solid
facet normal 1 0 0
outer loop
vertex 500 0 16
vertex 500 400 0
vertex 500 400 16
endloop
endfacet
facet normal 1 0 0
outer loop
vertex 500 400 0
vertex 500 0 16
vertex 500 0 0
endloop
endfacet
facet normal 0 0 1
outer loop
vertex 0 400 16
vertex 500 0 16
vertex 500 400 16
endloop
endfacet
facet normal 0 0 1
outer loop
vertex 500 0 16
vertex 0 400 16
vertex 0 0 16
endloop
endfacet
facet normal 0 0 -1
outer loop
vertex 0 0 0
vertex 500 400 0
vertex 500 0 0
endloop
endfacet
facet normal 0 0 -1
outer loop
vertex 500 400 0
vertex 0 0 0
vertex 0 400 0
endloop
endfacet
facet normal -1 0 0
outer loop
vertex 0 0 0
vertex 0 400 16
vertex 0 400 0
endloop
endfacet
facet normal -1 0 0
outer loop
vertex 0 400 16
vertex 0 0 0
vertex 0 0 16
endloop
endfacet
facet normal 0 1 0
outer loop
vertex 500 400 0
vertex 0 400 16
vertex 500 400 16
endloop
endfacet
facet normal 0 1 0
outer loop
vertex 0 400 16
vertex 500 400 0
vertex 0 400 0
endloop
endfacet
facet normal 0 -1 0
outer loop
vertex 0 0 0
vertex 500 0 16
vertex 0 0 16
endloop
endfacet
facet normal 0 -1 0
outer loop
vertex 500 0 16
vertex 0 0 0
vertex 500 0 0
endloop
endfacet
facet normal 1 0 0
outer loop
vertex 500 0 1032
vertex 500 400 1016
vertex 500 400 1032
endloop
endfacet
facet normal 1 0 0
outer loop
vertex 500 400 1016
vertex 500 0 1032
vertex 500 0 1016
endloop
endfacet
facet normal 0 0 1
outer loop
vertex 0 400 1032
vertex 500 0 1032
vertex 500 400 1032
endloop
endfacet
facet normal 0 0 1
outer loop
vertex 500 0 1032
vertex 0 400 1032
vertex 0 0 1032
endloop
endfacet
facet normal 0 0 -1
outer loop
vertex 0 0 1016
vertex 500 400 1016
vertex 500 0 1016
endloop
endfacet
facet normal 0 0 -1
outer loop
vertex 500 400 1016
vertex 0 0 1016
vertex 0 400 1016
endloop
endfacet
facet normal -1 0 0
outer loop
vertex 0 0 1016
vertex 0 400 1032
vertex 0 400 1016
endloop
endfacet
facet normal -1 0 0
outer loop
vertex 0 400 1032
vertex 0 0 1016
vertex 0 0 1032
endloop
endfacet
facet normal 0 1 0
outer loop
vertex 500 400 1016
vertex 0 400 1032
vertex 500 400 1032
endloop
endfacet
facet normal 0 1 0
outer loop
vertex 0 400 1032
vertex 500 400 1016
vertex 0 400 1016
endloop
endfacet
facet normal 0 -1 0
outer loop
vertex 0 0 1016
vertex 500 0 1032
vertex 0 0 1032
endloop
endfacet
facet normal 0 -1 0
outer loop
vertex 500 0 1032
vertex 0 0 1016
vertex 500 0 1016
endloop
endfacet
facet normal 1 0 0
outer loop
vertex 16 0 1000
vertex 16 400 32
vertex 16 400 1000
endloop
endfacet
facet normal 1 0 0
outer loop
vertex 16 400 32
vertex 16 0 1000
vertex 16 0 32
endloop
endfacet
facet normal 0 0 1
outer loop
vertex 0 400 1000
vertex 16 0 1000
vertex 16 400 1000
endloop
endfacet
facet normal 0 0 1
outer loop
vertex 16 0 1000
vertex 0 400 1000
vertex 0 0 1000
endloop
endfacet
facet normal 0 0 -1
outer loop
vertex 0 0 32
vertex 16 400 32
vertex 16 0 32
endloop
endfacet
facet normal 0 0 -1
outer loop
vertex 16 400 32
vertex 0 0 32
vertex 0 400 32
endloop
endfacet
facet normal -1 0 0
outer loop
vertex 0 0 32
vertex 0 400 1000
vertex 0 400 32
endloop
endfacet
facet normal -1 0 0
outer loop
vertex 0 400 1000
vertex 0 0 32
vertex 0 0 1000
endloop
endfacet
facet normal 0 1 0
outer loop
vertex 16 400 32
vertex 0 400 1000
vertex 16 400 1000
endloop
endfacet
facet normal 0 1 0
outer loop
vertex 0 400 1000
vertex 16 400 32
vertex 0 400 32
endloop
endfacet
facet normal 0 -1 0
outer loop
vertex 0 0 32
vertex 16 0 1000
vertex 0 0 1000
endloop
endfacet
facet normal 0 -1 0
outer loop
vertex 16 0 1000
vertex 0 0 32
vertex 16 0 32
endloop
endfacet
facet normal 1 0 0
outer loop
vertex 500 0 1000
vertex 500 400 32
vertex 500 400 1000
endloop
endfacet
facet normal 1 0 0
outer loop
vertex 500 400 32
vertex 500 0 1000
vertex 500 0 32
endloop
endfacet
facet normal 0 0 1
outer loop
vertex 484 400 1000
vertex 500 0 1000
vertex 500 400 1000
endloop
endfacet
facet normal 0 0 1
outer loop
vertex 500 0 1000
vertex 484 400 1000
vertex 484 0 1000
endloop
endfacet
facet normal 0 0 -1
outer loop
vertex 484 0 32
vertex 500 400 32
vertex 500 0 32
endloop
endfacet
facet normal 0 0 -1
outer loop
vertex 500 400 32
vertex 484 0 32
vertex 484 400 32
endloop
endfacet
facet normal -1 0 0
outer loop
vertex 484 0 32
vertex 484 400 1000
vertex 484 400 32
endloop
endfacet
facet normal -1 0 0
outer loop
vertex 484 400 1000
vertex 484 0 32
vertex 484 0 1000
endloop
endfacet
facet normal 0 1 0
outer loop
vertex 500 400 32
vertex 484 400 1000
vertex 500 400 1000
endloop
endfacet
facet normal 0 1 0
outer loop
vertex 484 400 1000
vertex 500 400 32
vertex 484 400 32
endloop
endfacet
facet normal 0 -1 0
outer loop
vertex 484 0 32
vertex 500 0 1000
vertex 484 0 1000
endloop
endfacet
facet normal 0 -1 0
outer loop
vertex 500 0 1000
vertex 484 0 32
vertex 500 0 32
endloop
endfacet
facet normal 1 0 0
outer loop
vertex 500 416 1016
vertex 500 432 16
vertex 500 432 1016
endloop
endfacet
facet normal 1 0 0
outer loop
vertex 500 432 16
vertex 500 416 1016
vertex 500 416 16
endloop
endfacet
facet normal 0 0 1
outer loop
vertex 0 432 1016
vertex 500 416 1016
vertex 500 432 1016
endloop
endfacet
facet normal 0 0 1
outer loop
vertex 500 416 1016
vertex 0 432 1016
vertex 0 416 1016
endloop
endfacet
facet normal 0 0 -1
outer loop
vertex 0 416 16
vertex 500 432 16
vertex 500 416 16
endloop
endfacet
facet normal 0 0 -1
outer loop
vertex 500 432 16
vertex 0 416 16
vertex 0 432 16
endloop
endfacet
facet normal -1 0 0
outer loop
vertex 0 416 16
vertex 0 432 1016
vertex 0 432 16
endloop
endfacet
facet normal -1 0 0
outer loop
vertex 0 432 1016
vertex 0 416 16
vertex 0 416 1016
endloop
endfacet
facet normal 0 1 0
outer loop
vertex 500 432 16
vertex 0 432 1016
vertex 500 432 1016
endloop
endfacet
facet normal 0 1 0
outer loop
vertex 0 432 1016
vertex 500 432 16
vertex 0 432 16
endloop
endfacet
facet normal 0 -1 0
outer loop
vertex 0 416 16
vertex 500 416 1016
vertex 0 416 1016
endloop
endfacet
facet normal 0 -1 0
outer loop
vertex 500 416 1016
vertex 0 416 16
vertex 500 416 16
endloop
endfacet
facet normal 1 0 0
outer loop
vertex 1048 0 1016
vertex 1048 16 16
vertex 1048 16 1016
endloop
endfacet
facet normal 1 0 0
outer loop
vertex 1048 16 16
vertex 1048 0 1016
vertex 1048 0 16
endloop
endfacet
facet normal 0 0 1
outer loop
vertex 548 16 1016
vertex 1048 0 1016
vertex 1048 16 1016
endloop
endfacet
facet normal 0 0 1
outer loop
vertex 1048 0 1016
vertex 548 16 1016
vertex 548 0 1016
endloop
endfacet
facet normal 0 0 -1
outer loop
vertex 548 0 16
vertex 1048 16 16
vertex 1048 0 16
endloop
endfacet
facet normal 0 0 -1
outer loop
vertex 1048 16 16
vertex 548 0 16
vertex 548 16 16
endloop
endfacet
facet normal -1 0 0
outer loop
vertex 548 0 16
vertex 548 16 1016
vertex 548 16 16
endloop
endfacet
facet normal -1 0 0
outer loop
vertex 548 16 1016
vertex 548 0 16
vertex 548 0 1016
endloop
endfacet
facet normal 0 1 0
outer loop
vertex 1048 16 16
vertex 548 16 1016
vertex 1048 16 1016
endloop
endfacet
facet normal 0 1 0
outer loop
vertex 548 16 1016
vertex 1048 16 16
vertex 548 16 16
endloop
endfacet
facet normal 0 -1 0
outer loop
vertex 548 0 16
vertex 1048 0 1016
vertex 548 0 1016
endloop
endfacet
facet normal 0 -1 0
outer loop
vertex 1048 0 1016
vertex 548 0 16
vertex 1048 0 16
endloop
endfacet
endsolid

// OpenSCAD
cube([500, 400, 16]);
translate([0, 0, 1000 + 16]) cube([500, 400, 16]);

translate([0, 0, 32]) cube([16, 400, 968]);
translate([500 - 16, 0, 32]) cube([16, 400, 968]);

translate([0, 400 + 16, 16]) cube([500, 16, 1000]);
translate([532 + 16, 0, 16]) cube([500, 16, 1000]);

// todo: legs
// vent: in/out
// lights
// hinges
